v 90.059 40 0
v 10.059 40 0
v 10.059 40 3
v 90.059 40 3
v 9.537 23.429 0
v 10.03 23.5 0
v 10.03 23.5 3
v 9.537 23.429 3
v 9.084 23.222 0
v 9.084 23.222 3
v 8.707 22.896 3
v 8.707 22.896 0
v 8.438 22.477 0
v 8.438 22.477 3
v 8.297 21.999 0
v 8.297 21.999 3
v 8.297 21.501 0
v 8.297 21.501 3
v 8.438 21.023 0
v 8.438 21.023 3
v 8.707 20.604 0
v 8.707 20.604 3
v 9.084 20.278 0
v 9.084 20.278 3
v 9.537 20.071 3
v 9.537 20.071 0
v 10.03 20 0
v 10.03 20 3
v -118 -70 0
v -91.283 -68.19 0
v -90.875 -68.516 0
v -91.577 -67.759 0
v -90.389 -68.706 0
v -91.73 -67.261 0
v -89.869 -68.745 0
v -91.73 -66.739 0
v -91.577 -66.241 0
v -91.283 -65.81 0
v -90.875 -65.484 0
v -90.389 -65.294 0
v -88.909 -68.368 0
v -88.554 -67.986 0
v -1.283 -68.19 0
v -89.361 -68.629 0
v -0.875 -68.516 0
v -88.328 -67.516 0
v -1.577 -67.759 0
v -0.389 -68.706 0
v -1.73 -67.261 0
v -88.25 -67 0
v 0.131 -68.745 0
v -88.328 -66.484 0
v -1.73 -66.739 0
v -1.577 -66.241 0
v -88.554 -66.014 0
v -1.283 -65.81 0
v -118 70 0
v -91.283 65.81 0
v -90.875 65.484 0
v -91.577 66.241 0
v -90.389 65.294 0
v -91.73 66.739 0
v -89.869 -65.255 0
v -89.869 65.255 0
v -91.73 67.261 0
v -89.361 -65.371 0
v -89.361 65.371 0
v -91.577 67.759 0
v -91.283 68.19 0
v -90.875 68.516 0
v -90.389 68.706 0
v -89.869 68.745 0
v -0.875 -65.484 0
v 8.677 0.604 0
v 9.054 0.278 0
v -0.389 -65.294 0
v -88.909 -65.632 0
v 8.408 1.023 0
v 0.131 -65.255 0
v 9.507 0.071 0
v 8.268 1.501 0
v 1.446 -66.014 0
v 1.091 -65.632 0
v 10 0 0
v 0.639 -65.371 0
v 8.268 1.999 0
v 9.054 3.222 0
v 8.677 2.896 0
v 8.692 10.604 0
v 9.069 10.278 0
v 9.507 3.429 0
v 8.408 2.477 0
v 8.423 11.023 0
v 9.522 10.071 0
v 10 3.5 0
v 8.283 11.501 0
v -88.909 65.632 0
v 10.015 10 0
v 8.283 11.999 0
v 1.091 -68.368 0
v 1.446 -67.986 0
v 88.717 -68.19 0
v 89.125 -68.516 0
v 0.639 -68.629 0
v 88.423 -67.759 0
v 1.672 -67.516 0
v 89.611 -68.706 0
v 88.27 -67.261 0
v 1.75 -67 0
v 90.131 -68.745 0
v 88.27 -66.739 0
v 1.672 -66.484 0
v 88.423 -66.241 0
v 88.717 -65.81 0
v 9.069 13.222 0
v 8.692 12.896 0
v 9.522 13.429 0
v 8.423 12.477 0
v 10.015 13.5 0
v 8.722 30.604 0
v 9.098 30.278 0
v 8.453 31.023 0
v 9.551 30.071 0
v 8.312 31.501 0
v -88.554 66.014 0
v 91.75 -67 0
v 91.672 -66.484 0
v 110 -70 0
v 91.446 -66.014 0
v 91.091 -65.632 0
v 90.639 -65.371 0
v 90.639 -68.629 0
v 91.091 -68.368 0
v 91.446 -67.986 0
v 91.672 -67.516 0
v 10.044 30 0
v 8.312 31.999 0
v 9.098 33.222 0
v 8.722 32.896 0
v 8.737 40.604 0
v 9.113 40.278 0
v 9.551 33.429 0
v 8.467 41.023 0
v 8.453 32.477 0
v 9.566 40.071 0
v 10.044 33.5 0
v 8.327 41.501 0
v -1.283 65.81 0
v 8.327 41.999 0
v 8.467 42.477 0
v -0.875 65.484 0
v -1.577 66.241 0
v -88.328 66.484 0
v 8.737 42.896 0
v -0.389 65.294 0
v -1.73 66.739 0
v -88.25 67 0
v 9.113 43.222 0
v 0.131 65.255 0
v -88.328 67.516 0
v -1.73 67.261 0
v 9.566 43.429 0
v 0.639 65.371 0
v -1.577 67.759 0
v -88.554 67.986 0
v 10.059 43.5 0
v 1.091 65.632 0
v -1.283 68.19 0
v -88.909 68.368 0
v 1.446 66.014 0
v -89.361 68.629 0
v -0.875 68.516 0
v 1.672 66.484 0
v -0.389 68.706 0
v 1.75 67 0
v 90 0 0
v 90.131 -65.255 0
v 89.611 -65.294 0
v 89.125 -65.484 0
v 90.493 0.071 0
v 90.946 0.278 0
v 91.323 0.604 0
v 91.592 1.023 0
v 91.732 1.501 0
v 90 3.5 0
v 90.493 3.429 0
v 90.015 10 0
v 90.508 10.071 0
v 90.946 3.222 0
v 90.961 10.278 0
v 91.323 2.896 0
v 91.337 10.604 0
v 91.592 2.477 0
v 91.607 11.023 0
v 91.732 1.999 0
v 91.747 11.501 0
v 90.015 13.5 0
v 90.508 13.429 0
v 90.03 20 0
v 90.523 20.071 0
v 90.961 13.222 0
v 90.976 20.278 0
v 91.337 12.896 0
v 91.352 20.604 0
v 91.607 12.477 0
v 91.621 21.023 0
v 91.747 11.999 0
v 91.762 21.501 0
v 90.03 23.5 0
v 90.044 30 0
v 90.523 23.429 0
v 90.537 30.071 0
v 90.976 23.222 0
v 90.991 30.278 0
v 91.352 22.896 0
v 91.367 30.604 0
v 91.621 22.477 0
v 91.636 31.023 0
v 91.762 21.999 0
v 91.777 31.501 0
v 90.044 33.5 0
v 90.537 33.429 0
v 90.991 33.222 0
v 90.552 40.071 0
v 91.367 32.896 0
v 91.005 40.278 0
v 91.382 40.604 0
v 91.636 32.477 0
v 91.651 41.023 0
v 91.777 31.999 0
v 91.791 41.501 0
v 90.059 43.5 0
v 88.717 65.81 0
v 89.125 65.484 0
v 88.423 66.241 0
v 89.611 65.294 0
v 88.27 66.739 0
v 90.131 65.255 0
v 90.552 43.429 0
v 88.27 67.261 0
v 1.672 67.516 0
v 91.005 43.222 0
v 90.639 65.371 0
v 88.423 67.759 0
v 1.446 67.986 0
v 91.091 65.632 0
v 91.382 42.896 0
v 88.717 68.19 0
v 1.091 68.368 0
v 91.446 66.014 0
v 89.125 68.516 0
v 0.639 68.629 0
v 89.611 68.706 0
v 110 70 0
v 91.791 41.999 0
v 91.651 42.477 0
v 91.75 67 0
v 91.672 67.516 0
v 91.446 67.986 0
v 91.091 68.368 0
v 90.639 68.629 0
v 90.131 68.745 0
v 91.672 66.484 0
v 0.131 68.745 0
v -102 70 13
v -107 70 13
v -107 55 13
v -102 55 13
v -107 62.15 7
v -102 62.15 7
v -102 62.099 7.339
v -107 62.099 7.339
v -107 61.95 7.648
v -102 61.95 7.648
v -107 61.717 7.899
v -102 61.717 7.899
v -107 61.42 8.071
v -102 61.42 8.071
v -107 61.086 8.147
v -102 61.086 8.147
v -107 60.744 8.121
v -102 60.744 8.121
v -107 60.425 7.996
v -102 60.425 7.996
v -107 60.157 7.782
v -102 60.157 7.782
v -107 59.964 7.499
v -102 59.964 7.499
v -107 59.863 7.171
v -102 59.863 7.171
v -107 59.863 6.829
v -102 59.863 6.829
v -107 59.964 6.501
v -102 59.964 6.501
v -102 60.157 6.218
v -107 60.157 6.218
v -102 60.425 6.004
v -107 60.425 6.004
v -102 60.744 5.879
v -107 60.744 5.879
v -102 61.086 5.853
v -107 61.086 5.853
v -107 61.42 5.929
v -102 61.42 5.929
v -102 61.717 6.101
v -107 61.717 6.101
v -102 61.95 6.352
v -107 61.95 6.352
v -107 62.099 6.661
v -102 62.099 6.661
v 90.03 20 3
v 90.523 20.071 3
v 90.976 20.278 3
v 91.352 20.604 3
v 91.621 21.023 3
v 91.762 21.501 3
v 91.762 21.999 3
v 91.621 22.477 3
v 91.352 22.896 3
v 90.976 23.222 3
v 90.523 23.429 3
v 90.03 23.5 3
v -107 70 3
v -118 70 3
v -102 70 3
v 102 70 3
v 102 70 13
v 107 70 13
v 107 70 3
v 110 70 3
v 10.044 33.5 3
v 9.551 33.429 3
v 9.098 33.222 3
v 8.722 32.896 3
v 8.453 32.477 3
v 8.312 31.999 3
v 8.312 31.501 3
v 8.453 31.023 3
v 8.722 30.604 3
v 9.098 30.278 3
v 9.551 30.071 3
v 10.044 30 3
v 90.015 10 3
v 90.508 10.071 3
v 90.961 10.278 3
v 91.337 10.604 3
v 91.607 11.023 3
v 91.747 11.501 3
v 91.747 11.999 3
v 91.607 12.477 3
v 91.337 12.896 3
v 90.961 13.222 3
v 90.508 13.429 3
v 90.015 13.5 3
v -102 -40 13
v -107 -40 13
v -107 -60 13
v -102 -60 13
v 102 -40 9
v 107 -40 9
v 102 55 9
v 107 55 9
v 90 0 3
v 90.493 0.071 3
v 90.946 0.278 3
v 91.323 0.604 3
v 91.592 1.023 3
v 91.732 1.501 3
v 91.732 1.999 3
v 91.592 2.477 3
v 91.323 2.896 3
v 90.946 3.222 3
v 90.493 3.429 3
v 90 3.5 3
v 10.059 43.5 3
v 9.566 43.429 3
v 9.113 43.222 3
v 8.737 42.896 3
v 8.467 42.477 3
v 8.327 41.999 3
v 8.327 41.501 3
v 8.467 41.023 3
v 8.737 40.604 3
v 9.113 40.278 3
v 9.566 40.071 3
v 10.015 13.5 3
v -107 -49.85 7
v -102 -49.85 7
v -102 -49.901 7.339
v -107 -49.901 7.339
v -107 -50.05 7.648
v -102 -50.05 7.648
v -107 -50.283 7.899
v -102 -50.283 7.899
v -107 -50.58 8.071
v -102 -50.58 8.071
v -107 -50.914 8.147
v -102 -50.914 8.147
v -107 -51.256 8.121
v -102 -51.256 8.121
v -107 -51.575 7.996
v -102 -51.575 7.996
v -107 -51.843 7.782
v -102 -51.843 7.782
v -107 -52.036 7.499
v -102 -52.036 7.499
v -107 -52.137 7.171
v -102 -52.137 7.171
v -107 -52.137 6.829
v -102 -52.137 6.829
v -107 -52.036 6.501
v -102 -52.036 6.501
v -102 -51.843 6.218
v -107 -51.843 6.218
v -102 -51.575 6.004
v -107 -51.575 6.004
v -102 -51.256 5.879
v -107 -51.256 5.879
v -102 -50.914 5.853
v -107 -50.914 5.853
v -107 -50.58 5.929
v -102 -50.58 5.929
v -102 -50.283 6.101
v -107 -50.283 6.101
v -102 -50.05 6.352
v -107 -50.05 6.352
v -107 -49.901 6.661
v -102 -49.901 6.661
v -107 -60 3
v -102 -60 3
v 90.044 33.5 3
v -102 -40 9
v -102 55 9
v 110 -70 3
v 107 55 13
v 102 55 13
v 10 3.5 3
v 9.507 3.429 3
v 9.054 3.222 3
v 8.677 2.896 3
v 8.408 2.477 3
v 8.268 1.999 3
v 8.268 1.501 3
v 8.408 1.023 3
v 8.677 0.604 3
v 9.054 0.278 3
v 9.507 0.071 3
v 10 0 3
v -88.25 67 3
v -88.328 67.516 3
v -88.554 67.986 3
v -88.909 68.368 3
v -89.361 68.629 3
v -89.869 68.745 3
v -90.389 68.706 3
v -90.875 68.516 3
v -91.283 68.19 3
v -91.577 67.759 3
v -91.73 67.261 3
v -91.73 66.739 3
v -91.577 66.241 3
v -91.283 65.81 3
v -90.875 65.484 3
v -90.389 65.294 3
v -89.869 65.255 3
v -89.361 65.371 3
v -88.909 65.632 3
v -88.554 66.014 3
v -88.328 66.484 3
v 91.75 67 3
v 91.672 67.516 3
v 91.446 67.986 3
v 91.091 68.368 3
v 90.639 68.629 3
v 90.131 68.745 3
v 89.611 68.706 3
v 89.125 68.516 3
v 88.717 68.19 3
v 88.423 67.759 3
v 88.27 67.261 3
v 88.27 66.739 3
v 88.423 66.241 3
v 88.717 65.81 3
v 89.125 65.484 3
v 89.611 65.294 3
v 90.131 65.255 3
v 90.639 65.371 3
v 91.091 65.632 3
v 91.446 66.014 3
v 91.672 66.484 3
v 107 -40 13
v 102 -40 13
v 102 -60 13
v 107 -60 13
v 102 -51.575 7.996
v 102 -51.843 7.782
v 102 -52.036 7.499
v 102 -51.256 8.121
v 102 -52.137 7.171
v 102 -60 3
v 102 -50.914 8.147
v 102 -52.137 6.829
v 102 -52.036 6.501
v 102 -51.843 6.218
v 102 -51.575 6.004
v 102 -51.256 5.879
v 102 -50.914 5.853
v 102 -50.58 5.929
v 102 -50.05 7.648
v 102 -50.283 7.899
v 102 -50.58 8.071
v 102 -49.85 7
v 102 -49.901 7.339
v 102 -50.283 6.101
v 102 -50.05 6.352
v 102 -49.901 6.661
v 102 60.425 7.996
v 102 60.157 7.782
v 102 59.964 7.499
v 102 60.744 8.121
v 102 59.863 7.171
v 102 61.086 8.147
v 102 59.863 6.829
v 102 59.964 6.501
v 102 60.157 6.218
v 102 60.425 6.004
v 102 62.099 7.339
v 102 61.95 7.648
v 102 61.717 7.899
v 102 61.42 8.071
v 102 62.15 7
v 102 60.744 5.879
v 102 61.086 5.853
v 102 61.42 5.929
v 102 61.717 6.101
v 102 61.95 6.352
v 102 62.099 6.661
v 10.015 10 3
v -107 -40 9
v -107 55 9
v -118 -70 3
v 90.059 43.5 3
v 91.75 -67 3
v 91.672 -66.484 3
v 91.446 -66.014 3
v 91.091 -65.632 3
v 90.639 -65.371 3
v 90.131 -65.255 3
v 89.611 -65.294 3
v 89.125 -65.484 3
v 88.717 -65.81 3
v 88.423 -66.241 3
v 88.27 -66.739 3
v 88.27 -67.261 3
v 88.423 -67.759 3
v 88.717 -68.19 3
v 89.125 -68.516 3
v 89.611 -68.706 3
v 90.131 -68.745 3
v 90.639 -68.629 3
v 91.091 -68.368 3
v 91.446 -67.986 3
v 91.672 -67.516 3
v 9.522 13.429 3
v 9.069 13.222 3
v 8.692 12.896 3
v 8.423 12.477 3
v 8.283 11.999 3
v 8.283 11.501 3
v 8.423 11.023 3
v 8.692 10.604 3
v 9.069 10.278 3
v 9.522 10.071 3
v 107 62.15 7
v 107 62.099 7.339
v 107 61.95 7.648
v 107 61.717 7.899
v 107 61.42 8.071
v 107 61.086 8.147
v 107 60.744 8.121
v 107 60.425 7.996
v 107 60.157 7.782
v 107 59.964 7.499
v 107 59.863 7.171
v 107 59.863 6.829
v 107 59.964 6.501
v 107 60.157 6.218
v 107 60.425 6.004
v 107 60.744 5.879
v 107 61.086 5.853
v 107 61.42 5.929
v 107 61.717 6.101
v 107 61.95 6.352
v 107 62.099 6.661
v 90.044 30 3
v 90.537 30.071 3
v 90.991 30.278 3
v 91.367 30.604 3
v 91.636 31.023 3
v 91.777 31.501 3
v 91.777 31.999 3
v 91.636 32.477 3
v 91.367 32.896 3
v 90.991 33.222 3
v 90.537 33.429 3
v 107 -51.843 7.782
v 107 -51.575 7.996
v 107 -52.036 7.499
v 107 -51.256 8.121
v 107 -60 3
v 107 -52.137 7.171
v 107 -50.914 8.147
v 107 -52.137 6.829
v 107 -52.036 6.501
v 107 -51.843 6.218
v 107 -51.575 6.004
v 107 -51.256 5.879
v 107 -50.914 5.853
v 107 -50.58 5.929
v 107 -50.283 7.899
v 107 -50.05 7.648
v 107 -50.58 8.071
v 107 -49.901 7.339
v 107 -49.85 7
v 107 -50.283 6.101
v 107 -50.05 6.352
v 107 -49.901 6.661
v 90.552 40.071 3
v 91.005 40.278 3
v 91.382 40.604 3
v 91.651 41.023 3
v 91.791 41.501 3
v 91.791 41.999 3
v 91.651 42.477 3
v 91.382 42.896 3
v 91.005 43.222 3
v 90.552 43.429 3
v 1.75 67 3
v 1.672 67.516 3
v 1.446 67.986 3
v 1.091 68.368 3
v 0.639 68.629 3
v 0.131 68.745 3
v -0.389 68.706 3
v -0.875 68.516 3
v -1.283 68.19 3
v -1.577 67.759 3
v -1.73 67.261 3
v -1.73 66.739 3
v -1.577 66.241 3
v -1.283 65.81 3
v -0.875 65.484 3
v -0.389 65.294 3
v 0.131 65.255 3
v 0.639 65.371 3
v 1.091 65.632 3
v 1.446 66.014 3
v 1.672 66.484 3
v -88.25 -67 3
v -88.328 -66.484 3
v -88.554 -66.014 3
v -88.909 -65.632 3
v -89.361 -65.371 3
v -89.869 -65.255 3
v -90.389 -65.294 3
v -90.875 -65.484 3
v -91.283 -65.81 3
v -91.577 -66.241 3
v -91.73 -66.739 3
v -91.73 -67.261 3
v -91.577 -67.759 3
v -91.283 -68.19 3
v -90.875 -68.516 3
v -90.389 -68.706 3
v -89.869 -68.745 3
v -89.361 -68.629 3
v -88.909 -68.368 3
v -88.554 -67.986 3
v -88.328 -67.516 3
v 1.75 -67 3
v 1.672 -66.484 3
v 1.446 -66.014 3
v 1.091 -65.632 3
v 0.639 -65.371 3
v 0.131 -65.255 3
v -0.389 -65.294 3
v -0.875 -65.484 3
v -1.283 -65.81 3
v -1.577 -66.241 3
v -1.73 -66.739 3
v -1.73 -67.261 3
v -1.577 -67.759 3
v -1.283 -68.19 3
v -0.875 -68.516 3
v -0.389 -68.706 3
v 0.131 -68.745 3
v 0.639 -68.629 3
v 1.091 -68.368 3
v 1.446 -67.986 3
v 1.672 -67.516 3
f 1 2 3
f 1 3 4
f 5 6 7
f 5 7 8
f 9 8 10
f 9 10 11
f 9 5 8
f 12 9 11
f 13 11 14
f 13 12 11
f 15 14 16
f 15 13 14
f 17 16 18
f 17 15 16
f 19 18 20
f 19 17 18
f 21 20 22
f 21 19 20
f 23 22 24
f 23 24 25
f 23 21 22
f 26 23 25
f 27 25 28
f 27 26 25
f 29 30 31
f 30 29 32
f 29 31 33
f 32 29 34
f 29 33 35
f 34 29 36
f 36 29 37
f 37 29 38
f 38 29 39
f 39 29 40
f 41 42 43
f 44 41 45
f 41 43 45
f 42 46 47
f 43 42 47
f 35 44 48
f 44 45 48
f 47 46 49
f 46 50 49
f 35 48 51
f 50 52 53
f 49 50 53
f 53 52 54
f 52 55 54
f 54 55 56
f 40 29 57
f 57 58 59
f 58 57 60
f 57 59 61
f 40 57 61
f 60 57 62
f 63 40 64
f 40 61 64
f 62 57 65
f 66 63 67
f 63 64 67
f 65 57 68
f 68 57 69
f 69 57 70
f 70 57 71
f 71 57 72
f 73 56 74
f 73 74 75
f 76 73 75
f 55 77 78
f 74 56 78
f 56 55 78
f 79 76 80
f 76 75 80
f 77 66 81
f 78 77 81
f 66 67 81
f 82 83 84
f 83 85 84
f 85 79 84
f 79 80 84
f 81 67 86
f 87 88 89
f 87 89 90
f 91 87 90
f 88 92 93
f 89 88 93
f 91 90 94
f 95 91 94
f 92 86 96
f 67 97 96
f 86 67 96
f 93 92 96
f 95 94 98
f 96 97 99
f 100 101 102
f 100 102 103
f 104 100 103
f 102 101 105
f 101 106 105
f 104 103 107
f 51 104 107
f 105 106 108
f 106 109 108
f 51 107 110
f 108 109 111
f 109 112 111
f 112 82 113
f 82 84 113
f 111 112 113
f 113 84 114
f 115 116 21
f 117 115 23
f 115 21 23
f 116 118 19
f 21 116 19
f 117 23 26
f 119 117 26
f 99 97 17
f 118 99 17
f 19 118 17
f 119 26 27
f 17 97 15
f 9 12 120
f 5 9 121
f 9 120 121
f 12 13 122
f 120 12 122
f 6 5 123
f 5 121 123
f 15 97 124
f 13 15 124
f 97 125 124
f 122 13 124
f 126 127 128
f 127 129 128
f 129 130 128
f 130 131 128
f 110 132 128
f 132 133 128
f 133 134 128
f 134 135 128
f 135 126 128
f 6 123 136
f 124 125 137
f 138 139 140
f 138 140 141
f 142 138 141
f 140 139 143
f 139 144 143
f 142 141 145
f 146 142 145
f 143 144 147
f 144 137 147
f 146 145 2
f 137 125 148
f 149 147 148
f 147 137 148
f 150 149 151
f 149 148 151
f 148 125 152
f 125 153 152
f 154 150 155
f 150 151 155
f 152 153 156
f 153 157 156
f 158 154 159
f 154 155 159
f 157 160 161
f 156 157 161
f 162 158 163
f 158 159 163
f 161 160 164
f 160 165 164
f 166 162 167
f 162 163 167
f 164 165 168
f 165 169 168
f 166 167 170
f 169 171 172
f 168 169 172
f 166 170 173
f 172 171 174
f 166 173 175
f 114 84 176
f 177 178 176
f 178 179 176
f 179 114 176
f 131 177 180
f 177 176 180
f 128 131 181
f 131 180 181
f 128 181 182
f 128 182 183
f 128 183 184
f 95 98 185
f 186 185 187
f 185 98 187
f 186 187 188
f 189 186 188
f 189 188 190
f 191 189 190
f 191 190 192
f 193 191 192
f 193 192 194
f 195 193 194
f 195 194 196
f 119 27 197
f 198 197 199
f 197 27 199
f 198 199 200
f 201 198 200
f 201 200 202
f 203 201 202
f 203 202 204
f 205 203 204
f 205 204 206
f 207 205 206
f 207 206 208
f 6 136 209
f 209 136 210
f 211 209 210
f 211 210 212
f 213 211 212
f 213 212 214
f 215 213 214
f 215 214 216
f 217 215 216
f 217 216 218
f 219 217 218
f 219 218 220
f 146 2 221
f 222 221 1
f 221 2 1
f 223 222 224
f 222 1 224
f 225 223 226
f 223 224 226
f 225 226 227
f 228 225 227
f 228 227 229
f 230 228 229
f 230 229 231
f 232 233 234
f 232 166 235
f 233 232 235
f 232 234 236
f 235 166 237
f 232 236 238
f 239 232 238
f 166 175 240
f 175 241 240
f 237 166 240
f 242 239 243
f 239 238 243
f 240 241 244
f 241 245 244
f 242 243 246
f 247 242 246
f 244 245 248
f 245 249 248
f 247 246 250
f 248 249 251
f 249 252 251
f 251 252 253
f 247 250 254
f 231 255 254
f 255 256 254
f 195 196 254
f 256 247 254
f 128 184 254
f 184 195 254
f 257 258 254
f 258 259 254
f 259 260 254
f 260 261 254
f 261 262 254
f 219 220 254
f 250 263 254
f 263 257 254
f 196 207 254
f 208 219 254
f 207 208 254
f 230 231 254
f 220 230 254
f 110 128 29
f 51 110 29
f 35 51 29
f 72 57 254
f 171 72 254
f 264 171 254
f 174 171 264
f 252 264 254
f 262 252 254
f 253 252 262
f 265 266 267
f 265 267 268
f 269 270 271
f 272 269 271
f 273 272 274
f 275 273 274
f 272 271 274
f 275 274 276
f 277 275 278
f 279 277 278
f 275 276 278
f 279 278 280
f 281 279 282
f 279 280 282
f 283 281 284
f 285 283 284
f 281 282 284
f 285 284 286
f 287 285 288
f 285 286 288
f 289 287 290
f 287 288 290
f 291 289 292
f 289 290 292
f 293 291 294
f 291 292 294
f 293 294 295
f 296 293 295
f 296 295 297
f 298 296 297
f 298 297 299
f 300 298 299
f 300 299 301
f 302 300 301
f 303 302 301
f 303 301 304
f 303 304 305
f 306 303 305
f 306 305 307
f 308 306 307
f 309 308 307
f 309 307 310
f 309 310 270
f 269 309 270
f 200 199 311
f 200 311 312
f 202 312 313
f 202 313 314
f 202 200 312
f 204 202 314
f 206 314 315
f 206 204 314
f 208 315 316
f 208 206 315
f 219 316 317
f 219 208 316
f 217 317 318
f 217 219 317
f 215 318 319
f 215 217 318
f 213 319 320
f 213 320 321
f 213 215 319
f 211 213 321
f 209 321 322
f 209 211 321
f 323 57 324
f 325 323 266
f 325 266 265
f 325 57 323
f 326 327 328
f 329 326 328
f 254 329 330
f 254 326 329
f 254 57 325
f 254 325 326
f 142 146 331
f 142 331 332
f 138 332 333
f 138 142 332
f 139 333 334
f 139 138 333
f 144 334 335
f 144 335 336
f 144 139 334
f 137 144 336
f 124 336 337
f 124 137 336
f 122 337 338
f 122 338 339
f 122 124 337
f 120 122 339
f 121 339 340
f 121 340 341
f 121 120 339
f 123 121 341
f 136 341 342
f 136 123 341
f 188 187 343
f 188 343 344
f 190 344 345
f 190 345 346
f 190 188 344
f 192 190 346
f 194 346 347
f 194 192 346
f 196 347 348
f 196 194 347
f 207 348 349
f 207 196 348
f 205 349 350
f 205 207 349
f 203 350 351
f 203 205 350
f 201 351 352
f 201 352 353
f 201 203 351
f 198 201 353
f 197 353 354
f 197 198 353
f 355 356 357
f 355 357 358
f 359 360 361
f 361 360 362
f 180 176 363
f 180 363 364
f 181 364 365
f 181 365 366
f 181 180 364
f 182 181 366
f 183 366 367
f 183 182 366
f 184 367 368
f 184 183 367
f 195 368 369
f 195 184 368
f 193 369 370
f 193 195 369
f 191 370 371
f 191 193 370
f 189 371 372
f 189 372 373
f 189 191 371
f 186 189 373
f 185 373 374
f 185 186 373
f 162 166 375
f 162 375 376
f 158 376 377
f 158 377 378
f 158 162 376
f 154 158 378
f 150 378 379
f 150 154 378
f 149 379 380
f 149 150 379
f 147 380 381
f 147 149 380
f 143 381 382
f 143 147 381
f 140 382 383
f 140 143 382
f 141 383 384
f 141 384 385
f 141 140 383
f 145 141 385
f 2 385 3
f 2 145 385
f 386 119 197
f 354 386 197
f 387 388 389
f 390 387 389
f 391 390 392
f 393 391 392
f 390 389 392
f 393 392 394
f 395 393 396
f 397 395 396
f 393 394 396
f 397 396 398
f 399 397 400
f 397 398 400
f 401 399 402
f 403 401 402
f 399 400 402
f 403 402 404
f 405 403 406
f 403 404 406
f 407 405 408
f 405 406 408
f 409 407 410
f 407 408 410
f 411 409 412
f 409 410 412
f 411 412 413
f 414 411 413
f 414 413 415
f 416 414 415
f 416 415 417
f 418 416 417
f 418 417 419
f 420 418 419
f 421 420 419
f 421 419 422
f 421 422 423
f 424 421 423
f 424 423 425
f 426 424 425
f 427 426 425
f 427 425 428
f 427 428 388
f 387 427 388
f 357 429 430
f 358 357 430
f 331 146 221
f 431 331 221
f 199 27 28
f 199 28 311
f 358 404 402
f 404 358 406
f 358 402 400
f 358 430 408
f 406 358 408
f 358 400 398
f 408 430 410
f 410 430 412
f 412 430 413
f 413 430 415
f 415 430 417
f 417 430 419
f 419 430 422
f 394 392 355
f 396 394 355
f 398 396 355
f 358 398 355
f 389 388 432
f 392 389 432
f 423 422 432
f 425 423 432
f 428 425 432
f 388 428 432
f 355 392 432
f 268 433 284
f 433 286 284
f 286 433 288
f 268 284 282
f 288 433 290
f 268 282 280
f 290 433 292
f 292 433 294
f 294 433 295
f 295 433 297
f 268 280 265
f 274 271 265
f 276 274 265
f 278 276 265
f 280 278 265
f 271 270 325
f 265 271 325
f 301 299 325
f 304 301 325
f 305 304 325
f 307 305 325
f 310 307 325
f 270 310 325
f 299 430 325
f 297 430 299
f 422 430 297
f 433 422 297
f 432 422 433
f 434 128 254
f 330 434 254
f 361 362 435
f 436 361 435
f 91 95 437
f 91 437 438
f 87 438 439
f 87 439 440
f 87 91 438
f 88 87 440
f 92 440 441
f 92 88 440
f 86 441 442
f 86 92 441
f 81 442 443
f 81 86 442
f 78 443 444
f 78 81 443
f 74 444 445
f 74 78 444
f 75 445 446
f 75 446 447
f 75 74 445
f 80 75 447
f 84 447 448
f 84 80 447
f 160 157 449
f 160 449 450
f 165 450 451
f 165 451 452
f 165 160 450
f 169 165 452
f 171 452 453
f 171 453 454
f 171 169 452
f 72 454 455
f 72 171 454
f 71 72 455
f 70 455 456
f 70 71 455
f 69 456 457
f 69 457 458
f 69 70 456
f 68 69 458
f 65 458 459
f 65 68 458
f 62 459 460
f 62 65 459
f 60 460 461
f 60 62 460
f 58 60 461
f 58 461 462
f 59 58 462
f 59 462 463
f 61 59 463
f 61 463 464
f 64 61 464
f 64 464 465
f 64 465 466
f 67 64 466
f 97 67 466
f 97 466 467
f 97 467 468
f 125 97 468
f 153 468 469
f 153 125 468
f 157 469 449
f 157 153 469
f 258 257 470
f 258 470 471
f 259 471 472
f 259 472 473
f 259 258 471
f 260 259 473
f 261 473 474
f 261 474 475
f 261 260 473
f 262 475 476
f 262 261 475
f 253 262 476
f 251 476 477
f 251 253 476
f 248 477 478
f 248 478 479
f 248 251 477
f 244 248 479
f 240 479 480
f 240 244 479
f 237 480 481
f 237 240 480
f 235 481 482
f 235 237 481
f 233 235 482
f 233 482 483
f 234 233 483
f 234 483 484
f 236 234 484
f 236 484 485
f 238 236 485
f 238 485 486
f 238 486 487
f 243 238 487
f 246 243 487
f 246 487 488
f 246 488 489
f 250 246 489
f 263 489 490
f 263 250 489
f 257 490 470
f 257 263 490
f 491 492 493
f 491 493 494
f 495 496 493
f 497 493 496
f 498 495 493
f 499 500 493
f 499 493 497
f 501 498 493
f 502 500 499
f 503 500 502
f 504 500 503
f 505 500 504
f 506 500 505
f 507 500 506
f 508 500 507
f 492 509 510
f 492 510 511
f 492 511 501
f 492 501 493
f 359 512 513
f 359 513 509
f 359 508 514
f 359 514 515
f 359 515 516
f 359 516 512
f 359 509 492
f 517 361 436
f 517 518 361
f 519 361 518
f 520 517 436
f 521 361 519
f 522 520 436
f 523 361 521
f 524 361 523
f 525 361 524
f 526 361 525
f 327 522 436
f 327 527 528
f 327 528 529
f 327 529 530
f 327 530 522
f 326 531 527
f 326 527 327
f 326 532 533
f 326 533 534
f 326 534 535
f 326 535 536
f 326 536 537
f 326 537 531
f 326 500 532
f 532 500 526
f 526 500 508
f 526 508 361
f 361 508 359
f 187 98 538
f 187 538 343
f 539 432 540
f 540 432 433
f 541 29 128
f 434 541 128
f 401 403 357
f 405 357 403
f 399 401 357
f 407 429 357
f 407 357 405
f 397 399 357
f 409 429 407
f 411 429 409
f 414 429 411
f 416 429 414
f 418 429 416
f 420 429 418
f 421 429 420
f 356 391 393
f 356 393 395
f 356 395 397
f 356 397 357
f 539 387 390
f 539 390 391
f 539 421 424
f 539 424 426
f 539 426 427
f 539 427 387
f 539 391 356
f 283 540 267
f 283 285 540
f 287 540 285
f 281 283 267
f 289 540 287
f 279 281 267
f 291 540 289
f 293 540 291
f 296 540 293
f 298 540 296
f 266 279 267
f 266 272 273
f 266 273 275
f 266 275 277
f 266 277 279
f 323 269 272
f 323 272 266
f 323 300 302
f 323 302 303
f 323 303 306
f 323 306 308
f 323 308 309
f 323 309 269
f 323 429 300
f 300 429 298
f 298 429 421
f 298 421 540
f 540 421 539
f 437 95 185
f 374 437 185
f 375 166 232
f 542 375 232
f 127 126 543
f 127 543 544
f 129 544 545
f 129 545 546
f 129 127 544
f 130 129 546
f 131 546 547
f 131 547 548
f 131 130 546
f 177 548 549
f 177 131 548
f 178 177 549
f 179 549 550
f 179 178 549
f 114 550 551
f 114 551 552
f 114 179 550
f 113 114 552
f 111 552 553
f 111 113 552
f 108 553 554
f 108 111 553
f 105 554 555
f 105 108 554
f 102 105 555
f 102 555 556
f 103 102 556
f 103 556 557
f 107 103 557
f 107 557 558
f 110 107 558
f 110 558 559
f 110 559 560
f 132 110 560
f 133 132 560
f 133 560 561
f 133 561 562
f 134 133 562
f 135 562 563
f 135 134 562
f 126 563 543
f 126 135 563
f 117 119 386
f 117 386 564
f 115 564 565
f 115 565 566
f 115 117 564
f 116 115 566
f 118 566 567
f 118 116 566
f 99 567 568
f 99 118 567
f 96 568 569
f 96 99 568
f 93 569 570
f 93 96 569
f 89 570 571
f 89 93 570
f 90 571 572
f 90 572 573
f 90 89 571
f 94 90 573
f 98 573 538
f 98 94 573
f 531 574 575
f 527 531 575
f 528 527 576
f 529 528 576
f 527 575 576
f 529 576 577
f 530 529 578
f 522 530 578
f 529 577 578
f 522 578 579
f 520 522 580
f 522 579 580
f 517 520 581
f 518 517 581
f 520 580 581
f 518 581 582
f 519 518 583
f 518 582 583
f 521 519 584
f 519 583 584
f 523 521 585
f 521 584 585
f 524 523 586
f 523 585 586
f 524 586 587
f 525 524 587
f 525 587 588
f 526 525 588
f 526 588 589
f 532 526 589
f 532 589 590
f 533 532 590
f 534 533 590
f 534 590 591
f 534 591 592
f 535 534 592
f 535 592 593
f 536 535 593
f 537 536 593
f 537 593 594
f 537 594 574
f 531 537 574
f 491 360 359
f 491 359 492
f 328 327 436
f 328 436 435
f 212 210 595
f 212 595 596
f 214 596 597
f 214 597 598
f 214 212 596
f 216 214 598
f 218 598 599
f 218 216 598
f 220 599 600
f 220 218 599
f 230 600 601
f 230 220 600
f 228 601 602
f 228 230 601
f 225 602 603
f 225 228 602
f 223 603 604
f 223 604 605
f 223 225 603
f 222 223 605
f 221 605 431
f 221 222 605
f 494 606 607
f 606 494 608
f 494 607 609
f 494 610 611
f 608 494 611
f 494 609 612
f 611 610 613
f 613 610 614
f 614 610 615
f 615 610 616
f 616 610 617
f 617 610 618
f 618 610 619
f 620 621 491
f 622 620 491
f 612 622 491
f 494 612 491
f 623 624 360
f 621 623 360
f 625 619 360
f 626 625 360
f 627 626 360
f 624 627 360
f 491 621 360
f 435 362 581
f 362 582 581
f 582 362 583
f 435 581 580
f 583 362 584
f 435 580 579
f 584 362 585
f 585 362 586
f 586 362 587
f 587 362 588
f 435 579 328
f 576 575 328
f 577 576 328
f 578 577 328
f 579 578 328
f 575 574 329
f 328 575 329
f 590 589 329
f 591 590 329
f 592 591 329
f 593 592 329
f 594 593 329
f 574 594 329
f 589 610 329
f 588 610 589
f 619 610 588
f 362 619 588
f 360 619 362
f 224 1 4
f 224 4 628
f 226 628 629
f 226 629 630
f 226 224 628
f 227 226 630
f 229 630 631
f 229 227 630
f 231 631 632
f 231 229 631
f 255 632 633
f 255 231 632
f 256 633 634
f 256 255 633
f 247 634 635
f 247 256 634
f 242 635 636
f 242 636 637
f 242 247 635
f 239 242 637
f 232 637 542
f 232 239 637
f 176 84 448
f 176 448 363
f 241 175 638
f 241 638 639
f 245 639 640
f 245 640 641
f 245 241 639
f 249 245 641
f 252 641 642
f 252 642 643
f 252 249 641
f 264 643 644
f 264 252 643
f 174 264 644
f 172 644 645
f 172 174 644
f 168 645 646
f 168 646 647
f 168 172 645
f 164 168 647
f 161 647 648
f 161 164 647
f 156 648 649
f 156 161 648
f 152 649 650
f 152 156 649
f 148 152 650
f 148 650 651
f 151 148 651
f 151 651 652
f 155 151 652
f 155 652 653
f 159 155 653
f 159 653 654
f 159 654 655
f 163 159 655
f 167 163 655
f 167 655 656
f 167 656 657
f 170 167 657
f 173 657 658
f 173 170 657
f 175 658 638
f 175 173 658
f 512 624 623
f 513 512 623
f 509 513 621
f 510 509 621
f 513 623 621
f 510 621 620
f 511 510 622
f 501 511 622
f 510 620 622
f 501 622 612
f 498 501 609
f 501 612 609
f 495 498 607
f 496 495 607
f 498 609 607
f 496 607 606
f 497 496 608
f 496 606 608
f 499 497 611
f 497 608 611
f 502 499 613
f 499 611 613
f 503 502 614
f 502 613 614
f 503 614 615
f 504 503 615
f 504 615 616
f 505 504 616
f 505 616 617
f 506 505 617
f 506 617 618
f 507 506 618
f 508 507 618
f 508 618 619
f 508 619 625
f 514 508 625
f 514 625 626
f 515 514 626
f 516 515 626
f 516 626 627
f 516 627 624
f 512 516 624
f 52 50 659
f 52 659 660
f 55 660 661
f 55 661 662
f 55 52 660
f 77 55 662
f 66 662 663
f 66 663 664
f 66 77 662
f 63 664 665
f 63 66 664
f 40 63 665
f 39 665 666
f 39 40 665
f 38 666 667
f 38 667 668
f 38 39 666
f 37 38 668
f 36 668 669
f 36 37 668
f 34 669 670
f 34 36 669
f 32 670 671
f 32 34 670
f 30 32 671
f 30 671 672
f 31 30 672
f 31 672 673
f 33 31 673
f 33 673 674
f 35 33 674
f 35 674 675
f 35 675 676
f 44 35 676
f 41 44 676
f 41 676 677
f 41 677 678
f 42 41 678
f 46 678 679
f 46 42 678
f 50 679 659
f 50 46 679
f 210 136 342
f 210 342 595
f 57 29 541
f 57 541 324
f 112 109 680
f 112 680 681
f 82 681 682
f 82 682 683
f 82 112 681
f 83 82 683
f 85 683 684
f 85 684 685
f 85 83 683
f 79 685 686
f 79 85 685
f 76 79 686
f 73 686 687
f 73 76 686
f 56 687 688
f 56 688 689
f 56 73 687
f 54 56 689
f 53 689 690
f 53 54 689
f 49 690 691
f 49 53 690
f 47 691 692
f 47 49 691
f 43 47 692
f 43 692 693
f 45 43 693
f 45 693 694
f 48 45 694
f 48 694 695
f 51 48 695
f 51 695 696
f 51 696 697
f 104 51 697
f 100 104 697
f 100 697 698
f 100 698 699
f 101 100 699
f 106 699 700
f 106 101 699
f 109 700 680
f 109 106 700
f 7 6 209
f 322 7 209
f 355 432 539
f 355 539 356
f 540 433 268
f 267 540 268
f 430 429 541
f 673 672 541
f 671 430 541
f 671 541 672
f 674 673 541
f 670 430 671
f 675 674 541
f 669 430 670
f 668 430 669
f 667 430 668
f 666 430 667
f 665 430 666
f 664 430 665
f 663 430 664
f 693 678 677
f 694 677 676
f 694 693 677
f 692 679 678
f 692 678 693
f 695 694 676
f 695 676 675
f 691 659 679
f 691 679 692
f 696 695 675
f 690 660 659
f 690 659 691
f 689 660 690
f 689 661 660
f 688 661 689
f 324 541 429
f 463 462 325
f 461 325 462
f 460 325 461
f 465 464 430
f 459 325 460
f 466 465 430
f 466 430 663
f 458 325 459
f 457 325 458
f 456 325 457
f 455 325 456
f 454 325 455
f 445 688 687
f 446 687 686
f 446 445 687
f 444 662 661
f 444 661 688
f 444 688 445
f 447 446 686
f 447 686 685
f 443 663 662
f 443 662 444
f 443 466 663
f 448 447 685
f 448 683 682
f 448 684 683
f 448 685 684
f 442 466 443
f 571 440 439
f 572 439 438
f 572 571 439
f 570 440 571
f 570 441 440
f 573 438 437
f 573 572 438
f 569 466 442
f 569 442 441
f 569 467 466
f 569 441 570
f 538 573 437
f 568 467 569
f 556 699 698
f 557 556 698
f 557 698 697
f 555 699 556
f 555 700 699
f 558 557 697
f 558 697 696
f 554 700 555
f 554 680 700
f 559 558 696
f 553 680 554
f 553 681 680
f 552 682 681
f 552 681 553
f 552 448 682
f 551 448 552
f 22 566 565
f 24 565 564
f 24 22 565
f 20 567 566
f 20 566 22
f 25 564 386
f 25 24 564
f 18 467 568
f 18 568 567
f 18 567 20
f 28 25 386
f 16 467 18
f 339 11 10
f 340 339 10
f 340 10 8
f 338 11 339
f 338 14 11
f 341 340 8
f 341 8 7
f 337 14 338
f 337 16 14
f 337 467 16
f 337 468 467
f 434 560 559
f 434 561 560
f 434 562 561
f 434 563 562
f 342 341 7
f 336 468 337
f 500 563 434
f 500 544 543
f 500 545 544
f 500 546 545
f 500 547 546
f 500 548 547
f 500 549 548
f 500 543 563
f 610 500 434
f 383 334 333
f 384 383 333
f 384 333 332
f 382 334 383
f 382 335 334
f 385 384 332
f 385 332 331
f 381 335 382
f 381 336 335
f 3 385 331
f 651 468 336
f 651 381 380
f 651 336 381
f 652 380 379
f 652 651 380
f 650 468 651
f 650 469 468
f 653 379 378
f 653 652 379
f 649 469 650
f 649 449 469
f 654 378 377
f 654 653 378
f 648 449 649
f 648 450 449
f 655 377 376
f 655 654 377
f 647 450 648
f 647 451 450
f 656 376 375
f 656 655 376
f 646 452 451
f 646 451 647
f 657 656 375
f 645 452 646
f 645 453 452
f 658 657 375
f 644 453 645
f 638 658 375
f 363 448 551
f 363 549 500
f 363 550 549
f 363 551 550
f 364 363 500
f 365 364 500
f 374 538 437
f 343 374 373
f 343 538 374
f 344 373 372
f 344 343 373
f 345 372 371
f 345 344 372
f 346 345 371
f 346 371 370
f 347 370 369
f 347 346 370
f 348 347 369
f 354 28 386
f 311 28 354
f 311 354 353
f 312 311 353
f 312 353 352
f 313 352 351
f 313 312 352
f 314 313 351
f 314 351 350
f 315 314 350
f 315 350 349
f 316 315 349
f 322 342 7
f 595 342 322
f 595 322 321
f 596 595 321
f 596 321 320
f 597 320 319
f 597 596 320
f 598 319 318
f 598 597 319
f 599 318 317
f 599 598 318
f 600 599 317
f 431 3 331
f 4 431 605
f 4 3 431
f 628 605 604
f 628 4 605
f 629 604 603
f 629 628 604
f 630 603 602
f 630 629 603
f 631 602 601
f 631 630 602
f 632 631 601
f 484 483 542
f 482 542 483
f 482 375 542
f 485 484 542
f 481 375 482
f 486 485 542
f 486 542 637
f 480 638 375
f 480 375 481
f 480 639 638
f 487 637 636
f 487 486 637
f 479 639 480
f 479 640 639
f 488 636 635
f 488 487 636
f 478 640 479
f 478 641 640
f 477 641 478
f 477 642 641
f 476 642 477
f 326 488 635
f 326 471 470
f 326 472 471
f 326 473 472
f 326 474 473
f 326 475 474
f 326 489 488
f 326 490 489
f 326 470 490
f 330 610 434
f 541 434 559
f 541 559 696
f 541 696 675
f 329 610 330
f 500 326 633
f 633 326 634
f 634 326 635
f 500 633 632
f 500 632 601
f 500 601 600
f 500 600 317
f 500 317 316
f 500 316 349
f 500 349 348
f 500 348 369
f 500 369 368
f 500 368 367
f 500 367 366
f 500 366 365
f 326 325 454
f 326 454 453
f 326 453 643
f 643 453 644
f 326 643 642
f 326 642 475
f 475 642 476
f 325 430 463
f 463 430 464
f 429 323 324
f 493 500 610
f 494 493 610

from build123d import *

# Parameters (mm, degrees)
SKETCH_W     = 228
SKETCH_H     = 140
SKETCH_R     = 1.75
PAD_DEPTH    = 3
SKETCH001_W  = 5
SKETCH001_H  = 130
PAD001_DEPTH = 10
SKETCH002_R  = 1.15
SKETCH002_W  = 95
SKETCH002_H  = 4
POCKET_DEPTH = 225


with BuildPart() as part:
    # Sketch → Pad (new body)
    with BuildSketch(Plane.XY):
        with Locations((-4, 0)):
            Rectangle(SKETCH_W, SKETCH_H)
        with Locations((-90, 67)):
            Circle(SKETCH_R, mode=Mode.SUBTRACT)
        with Locations((0, 67)):
            Circle(SKETCH_R, mode=Mode.SUBTRACT)
        with Locations((90, 67)):
            Circle(SKETCH_R, mode=Mode.SUBTRACT)
        with Locations((-90, -67)):
            Circle(SKETCH_R, mode=Mode.SUBTRACT)
        with Locations((0, -67)):
            Circle(SKETCH_R, mode=Mode.SUBTRACT)
        with Locations((90, -67)):
            Circle(SKETCH_R, mode=Mode.SUBTRACT)
        with BuildLine():
            ThreePointArc((10.059248, 43.499956), (8.309248, 41.749956), (10.059248, 39.999956))
            Line((10.059248, 39.999956), (90.059248, 39.999956))
            ThreePointArc((90.059248, 39.999956), (91.809248, 41.749956), (90.059248, 43.499956))
            Line((10.059248, 43.499956), (90.059248, 43.499956))
        make_face(mode=Mode.SUBTRACT)
        with BuildLine():
            ThreePointArc((10.044436, 33.499967), (8.294436, 31.749967), (10.044436, 29.999967))
            Line((10.044436, 29.999967), (90.044436, 29.999967))
            ThreePointArc((90.044436, 29.999967), (91.794436, 31.749967), (90.044436, 33.499967))
            Line((10.044436, 33.499967), (90.044436, 33.499967))
        make_face(mode=Mode.SUBTRACT)
        with BuildLine():
            ThreePointArc((10.029624, 23.499978), (8.279624, 21.749978), (10.029624, 19.999978))
            Line((10.029624, 19.999978), (90.029624, 19.999978))
            ThreePointArc((90.029624, 19.999978), (91.779624, 21.749978), (90.029624, 23.499978))
            Line((10.029624, 23.499978), (90.029624, 23.499978))
        make_face(mode=Mode.SUBTRACT)
        with BuildLine():
            ThreePointArc((10.014812, 13.499989), (8.264812, 11.749989), (10.014812, 9.999989))
            Line((10.014812, 9.999989), (90.014812, 9.999989))
            ThreePointArc((90.014812, 9.999989), (91.764812, 11.749989), (90.014812, 13.499989))
            Line((10.014812, 13.499989), (90.014812, 13.499989))
        make_face(mode=Mode.SUBTRACT)
        with BuildLine():
            ThreePointArc((10, 3.5), (8.25, 1.75), (10, 0))
            Line((10, 0), (90, 0))
            ThreePointArc((90, 0), (91.75, 1.75), (90, 3.5))
            Line((10, 3.5), (90, 3.5))
        make_face(mode=Mode.SUBTRACT)
    extrude(amount=PAD_DEPTH)

    # Sketch001 → Pad001 (join)
    with BuildSketch(Plane.XY.offset(3)):
        with Locations((104.5, 5)):
            Rectangle(SKETCH001_W, SKETCH001_H)
        with Locations((-104.5, 5)):
            Rectangle(SKETCH001_W, SKETCH001_H)
    extrude(amount=PAD001_DEPTH)

    # Sketch002 → Pocket (cut)
    with BuildSketch(Plane.YZ.offset(107)):
        with Locations((-51, 7)):
            Circle(SKETCH002_R)
        with Locations((61, 7)):
            Circle(SKETCH002_R)
        with Locations((7.5, 11)):
            Rectangle(SKETCH002_W, SKETCH002_H)
    extrude(amount=-POCKET_DEPTH, mode=Mode.SUBTRACT)


solid = part.part
